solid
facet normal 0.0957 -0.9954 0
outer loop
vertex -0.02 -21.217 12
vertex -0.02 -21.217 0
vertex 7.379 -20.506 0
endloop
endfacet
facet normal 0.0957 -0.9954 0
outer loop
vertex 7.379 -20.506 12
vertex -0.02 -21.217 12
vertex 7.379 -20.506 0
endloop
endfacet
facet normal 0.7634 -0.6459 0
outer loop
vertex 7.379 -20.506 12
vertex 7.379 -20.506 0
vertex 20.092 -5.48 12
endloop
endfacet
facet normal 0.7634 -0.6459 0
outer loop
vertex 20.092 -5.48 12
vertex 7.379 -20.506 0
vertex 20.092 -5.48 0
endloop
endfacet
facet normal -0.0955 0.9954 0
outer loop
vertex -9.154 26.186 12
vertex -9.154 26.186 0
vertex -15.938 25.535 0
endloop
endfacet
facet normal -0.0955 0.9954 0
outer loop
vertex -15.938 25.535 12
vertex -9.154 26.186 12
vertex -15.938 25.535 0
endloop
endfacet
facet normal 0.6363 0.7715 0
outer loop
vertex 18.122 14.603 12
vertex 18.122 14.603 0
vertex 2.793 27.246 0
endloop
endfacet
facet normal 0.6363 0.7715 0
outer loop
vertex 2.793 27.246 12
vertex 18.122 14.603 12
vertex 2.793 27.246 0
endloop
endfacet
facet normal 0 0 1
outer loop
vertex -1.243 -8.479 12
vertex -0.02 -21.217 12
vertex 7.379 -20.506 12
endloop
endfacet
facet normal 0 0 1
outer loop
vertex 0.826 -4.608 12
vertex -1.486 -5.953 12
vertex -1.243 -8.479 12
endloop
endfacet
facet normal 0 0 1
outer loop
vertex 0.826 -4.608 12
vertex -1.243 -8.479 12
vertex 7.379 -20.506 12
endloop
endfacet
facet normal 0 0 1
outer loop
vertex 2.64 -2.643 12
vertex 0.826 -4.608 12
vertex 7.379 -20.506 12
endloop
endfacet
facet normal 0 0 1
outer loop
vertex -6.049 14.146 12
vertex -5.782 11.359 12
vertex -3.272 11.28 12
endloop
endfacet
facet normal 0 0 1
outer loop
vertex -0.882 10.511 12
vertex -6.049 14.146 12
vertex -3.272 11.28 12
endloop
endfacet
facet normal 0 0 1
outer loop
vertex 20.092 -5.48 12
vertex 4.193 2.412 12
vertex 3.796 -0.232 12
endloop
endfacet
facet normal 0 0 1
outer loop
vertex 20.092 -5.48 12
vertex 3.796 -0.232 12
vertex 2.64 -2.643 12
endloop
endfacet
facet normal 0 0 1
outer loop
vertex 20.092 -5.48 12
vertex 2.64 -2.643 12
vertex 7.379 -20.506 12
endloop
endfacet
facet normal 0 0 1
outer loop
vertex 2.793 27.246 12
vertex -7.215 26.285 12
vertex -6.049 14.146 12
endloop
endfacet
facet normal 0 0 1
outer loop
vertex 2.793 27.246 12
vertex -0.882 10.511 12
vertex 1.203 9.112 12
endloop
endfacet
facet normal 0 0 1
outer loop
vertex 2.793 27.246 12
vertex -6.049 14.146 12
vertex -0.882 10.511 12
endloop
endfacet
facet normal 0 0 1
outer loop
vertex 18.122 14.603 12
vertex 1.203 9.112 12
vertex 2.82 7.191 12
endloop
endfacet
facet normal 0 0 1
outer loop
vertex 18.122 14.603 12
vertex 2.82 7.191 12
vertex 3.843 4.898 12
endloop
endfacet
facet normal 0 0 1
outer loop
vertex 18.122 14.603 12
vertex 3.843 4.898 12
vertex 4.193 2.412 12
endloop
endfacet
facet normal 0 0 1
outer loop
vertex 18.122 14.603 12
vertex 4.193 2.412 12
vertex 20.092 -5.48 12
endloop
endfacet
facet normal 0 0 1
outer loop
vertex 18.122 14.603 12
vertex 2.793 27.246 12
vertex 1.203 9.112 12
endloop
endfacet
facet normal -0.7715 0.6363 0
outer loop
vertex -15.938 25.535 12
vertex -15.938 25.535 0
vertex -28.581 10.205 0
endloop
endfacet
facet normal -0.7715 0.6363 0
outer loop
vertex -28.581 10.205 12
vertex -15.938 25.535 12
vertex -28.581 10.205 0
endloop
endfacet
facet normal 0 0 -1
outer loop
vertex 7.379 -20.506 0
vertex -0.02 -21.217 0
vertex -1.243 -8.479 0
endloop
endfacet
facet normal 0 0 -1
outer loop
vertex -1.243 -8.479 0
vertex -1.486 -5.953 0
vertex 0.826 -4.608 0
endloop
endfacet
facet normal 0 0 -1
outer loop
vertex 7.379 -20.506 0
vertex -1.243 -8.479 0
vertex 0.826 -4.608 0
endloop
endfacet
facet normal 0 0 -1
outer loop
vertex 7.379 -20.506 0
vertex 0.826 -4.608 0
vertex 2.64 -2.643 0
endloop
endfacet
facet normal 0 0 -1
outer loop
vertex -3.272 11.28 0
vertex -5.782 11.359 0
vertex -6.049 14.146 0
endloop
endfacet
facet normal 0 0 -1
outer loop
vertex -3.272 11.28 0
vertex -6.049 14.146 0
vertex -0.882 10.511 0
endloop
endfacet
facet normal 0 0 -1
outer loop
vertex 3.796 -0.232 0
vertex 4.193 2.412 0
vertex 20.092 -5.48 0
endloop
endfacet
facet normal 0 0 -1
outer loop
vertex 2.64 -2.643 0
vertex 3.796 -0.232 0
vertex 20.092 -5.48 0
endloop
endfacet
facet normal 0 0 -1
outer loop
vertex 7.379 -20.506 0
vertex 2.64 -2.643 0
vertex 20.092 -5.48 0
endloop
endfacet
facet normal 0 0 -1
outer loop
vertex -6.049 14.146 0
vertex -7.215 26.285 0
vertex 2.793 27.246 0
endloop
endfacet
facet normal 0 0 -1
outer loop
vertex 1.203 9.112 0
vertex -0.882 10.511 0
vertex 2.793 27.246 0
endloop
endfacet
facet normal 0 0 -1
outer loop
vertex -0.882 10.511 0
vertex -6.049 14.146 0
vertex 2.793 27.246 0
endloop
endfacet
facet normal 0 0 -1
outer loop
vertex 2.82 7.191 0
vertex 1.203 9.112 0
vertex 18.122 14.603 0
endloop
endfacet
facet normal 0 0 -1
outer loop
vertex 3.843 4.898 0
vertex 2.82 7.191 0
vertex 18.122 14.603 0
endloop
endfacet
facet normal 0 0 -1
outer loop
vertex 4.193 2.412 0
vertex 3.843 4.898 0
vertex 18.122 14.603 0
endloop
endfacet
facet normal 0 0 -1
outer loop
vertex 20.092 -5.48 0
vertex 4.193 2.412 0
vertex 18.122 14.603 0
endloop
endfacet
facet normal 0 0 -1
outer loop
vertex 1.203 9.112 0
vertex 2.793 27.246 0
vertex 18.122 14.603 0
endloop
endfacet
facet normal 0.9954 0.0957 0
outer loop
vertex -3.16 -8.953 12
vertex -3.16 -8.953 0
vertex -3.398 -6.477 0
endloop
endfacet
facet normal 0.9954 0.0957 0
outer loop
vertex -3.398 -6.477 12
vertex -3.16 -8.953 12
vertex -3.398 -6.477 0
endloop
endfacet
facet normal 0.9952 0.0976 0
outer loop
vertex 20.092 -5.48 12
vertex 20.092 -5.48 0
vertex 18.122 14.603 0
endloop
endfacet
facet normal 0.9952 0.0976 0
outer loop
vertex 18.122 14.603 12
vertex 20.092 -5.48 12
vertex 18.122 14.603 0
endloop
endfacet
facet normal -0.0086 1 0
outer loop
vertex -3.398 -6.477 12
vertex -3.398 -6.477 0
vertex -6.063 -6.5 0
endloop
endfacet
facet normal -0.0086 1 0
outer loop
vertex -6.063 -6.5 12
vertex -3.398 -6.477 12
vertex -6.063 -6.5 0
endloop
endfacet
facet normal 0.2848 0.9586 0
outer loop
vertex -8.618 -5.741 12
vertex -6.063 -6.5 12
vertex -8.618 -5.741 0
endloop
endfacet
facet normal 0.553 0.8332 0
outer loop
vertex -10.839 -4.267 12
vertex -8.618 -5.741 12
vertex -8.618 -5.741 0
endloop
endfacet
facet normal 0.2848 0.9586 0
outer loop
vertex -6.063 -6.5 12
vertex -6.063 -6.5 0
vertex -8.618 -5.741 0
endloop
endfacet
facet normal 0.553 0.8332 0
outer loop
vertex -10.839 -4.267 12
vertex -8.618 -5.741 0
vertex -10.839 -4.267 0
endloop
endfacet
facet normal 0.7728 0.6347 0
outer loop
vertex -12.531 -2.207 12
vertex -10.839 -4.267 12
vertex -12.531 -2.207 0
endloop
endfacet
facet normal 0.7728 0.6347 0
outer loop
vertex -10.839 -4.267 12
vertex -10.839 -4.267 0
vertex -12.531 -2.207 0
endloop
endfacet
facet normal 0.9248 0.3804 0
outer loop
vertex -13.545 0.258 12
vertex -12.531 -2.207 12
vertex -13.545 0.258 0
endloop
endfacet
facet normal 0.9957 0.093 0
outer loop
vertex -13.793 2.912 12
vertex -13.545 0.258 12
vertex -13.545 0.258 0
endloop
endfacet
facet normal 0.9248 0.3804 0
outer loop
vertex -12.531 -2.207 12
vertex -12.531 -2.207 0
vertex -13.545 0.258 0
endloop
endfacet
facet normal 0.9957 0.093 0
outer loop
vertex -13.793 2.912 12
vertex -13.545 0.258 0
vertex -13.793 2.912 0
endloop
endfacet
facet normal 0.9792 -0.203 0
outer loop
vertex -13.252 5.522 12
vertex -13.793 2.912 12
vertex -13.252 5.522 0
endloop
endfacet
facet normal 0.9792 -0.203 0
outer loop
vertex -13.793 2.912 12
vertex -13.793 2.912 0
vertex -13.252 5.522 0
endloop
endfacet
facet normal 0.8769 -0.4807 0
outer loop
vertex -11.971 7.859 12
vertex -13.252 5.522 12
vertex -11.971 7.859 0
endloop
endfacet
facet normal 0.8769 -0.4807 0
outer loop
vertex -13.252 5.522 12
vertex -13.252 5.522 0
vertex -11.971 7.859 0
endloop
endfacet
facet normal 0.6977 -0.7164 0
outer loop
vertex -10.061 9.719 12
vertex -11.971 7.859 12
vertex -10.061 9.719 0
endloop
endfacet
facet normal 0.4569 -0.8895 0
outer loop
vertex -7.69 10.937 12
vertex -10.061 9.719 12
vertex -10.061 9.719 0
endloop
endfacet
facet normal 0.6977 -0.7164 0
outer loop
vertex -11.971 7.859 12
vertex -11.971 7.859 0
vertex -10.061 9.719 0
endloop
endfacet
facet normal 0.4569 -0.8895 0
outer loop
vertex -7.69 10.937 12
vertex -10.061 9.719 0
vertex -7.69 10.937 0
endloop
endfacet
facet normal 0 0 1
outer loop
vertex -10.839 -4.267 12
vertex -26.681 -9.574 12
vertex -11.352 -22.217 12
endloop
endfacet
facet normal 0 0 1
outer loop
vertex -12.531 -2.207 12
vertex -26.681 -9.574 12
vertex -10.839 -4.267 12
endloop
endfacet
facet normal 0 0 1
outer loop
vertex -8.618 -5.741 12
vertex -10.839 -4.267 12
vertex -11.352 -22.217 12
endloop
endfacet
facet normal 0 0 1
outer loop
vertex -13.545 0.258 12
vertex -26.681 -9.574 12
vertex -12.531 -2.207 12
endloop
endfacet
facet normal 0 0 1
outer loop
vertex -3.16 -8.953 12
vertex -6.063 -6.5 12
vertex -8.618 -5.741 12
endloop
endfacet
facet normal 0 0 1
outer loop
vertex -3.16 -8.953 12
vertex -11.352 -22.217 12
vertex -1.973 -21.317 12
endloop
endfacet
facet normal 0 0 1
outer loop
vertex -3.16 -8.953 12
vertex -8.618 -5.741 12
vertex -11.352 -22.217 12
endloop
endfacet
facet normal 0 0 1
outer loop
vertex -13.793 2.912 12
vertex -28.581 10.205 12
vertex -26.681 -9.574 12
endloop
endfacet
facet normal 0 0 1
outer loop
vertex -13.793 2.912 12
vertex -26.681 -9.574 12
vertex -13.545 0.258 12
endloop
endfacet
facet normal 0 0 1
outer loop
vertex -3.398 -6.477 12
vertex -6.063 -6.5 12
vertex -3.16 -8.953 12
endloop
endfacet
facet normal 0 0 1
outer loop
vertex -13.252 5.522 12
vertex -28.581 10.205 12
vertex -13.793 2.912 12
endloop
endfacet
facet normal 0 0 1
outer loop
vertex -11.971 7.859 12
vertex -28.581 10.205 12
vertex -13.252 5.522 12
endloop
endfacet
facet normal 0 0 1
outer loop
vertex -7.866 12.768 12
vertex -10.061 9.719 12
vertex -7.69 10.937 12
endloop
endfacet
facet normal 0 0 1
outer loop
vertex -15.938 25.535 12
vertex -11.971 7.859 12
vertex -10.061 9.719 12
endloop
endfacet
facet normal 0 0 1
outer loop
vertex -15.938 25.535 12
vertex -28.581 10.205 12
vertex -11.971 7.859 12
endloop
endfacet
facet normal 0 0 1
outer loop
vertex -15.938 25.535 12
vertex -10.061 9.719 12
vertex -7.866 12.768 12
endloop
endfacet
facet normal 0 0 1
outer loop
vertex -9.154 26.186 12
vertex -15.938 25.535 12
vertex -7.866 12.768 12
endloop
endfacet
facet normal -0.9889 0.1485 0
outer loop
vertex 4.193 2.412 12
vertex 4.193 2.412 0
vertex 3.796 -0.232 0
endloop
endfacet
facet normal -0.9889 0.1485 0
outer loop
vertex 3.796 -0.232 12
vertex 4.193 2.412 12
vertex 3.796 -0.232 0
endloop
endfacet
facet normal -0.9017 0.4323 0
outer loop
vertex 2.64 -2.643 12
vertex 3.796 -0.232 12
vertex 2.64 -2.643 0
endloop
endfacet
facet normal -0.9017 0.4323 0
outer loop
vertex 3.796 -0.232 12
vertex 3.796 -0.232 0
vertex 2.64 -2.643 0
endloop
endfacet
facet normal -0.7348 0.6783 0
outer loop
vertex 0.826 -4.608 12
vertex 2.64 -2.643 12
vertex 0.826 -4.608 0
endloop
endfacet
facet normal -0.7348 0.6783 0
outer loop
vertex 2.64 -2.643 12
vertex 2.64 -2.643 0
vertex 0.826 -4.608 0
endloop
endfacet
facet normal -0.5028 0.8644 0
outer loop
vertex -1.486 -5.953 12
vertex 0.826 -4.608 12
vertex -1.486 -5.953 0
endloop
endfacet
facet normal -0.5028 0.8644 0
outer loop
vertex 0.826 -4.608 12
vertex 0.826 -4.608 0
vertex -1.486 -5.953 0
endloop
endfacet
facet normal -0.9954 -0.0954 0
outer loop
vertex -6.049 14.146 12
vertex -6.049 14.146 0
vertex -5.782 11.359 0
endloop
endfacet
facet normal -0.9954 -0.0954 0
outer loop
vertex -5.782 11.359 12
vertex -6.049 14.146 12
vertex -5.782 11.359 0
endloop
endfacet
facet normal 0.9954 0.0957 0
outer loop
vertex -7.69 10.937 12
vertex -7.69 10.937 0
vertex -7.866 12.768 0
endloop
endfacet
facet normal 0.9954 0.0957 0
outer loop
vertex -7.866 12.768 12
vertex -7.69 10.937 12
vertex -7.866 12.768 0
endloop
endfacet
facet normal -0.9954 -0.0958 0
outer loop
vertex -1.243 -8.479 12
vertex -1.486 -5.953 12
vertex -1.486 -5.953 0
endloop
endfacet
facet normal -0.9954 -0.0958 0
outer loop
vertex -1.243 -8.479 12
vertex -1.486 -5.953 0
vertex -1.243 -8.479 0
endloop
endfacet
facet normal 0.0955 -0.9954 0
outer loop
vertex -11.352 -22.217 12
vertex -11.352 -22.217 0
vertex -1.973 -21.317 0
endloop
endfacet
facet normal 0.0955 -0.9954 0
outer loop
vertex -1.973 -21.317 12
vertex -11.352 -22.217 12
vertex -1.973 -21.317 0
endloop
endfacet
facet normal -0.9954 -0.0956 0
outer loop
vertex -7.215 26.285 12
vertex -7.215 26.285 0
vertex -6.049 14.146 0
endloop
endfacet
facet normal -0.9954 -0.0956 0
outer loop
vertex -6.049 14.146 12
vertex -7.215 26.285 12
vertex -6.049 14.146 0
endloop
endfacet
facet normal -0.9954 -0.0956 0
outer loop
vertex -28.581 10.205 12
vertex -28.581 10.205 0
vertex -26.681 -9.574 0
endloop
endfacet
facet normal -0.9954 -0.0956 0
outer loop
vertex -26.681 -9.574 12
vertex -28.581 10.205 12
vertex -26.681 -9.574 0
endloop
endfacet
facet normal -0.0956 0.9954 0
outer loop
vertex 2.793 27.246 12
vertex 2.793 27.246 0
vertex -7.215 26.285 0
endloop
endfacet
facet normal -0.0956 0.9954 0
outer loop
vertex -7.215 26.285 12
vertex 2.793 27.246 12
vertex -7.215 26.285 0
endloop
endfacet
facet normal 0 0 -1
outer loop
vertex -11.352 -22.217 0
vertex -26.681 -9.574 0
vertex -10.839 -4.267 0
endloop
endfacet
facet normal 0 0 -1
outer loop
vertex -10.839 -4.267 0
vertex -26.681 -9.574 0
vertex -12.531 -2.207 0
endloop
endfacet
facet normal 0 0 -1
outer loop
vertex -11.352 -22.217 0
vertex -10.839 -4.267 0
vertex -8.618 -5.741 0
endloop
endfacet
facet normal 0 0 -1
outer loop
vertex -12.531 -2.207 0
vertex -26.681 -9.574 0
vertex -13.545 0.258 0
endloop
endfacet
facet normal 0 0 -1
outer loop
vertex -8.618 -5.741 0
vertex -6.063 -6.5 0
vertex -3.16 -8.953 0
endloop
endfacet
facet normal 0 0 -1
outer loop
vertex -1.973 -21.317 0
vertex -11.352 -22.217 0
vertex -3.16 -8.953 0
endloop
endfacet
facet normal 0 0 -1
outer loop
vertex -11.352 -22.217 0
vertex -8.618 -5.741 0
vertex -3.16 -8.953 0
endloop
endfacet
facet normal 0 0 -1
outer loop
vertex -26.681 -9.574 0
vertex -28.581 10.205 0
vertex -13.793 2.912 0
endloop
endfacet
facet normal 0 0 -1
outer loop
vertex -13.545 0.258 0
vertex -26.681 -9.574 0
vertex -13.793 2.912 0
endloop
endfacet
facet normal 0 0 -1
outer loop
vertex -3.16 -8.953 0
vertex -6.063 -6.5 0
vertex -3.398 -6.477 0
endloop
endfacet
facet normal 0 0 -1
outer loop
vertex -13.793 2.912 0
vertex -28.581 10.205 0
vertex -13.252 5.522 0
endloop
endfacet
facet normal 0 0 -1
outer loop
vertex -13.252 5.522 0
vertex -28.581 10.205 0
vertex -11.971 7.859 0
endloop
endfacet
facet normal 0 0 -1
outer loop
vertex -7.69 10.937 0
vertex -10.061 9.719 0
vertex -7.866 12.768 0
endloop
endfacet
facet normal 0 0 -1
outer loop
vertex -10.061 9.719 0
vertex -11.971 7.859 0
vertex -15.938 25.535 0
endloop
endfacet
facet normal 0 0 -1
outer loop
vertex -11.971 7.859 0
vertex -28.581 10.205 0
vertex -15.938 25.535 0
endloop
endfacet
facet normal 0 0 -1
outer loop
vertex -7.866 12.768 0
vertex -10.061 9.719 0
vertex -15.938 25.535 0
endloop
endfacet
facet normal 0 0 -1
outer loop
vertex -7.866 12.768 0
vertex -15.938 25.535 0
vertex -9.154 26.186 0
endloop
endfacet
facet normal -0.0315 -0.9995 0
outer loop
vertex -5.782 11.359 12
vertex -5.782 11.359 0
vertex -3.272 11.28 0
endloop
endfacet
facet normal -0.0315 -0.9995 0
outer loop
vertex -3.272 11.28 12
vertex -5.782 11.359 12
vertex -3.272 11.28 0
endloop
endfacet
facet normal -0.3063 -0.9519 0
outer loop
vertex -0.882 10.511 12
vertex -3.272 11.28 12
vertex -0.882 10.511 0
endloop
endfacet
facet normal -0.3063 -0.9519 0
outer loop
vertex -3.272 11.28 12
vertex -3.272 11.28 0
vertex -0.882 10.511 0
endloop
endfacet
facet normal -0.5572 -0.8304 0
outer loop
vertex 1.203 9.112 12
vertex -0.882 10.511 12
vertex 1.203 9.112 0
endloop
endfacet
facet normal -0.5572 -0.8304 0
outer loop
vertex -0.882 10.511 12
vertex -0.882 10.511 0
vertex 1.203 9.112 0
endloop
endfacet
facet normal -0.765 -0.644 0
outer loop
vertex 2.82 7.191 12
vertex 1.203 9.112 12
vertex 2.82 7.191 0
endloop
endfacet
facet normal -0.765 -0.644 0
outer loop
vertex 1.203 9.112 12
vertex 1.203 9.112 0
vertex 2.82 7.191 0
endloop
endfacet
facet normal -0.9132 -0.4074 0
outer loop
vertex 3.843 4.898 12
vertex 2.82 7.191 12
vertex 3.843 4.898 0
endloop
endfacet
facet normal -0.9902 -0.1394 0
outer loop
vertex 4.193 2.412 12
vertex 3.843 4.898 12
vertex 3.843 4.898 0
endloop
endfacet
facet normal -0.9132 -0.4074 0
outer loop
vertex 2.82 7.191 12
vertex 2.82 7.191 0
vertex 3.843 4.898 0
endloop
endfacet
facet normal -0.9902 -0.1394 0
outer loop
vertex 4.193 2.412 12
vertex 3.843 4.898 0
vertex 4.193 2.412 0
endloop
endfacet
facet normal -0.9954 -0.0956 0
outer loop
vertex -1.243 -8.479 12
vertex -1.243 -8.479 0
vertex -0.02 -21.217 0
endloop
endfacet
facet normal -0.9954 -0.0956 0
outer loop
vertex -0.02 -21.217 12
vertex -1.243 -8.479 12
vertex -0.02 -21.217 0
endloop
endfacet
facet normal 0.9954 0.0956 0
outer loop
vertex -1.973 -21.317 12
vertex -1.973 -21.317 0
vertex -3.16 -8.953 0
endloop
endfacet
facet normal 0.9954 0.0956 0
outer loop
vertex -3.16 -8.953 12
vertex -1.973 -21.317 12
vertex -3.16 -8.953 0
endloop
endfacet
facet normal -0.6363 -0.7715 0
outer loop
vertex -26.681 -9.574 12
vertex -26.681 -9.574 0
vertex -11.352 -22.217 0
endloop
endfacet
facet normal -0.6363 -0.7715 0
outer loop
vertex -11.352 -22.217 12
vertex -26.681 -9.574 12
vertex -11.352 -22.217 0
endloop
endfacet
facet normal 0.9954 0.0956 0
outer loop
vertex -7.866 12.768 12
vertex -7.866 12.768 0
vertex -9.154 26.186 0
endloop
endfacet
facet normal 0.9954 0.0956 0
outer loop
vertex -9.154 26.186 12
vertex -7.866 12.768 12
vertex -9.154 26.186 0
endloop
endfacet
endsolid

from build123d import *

# Parameters (mm, degrees)
F1_DEPTH = 12


with BuildPart() as f1:
    # F0 (on Top) → F1 (new body)
    with BuildSketch(Plane.XY):
        with BuildLine():
            ThreePointArc((-3.397688, -6.477198), (-13.545036, 0.257976), (-7.690062, 10.93742))
            Line((-7.690062, 10.93742), (-7.865827, 12.767737))
            Line((-7.865827, 12.767737), (-9.154391, 26.186067))
            Line((-9.154391, 26.186067), (-15.937662, 25.534669))
            Line((-15.937662, 25.534669), (-28.580804, 10.205324))
            Line((-28.580804, 10.205324), (-26.681373, -9.574211))
            Line((-26.681373, -9.574211), (-11.352029, -22.217354))
            Line((-11.352029, -22.217354), (-1.972654, -21.316651))
            Line((-1.972654, -21.316651), (-3.159916, -8.953218))
            Line((-3.159916, -8.953218), (-3.397688, -6.477198))
        make_face()
        with BuildLine():
            Line((18.122257, 14.602686), (2.792913, 27.245828))
            Line((2.792913, 27.245828), (-7.215111, 26.284757))
            Line((-7.215111, 26.284757), (-6.049431, 14.14607))
            Line((-6.049431, 14.14607), (-5.781774, 11.358852))
            ThreePointArc((-5.781774, 11.358852), (1.202724, 9.111727), (4.193434, 2.411843))
            ThreePointArc((4.193434, 2.411843), (2.63956, -2.643372), (-1.4855, -5.952995))
            Line((-1.4855, -5.952995), (-1.242973, -8.478526))
            Line((-1.242973, -8.478526), (-0.01973, -21.216651))
            Line((-0.01973, -21.216651), (7.378545, -20.506194))
            Line((7.378545, -20.506194), (20.091543, -5.4801))
            Line((20.091543, -5.4801), (18.122257, 14.602686))
        make_face()
    extrude(amount=F1_DEPTH)


solid = f1.part
